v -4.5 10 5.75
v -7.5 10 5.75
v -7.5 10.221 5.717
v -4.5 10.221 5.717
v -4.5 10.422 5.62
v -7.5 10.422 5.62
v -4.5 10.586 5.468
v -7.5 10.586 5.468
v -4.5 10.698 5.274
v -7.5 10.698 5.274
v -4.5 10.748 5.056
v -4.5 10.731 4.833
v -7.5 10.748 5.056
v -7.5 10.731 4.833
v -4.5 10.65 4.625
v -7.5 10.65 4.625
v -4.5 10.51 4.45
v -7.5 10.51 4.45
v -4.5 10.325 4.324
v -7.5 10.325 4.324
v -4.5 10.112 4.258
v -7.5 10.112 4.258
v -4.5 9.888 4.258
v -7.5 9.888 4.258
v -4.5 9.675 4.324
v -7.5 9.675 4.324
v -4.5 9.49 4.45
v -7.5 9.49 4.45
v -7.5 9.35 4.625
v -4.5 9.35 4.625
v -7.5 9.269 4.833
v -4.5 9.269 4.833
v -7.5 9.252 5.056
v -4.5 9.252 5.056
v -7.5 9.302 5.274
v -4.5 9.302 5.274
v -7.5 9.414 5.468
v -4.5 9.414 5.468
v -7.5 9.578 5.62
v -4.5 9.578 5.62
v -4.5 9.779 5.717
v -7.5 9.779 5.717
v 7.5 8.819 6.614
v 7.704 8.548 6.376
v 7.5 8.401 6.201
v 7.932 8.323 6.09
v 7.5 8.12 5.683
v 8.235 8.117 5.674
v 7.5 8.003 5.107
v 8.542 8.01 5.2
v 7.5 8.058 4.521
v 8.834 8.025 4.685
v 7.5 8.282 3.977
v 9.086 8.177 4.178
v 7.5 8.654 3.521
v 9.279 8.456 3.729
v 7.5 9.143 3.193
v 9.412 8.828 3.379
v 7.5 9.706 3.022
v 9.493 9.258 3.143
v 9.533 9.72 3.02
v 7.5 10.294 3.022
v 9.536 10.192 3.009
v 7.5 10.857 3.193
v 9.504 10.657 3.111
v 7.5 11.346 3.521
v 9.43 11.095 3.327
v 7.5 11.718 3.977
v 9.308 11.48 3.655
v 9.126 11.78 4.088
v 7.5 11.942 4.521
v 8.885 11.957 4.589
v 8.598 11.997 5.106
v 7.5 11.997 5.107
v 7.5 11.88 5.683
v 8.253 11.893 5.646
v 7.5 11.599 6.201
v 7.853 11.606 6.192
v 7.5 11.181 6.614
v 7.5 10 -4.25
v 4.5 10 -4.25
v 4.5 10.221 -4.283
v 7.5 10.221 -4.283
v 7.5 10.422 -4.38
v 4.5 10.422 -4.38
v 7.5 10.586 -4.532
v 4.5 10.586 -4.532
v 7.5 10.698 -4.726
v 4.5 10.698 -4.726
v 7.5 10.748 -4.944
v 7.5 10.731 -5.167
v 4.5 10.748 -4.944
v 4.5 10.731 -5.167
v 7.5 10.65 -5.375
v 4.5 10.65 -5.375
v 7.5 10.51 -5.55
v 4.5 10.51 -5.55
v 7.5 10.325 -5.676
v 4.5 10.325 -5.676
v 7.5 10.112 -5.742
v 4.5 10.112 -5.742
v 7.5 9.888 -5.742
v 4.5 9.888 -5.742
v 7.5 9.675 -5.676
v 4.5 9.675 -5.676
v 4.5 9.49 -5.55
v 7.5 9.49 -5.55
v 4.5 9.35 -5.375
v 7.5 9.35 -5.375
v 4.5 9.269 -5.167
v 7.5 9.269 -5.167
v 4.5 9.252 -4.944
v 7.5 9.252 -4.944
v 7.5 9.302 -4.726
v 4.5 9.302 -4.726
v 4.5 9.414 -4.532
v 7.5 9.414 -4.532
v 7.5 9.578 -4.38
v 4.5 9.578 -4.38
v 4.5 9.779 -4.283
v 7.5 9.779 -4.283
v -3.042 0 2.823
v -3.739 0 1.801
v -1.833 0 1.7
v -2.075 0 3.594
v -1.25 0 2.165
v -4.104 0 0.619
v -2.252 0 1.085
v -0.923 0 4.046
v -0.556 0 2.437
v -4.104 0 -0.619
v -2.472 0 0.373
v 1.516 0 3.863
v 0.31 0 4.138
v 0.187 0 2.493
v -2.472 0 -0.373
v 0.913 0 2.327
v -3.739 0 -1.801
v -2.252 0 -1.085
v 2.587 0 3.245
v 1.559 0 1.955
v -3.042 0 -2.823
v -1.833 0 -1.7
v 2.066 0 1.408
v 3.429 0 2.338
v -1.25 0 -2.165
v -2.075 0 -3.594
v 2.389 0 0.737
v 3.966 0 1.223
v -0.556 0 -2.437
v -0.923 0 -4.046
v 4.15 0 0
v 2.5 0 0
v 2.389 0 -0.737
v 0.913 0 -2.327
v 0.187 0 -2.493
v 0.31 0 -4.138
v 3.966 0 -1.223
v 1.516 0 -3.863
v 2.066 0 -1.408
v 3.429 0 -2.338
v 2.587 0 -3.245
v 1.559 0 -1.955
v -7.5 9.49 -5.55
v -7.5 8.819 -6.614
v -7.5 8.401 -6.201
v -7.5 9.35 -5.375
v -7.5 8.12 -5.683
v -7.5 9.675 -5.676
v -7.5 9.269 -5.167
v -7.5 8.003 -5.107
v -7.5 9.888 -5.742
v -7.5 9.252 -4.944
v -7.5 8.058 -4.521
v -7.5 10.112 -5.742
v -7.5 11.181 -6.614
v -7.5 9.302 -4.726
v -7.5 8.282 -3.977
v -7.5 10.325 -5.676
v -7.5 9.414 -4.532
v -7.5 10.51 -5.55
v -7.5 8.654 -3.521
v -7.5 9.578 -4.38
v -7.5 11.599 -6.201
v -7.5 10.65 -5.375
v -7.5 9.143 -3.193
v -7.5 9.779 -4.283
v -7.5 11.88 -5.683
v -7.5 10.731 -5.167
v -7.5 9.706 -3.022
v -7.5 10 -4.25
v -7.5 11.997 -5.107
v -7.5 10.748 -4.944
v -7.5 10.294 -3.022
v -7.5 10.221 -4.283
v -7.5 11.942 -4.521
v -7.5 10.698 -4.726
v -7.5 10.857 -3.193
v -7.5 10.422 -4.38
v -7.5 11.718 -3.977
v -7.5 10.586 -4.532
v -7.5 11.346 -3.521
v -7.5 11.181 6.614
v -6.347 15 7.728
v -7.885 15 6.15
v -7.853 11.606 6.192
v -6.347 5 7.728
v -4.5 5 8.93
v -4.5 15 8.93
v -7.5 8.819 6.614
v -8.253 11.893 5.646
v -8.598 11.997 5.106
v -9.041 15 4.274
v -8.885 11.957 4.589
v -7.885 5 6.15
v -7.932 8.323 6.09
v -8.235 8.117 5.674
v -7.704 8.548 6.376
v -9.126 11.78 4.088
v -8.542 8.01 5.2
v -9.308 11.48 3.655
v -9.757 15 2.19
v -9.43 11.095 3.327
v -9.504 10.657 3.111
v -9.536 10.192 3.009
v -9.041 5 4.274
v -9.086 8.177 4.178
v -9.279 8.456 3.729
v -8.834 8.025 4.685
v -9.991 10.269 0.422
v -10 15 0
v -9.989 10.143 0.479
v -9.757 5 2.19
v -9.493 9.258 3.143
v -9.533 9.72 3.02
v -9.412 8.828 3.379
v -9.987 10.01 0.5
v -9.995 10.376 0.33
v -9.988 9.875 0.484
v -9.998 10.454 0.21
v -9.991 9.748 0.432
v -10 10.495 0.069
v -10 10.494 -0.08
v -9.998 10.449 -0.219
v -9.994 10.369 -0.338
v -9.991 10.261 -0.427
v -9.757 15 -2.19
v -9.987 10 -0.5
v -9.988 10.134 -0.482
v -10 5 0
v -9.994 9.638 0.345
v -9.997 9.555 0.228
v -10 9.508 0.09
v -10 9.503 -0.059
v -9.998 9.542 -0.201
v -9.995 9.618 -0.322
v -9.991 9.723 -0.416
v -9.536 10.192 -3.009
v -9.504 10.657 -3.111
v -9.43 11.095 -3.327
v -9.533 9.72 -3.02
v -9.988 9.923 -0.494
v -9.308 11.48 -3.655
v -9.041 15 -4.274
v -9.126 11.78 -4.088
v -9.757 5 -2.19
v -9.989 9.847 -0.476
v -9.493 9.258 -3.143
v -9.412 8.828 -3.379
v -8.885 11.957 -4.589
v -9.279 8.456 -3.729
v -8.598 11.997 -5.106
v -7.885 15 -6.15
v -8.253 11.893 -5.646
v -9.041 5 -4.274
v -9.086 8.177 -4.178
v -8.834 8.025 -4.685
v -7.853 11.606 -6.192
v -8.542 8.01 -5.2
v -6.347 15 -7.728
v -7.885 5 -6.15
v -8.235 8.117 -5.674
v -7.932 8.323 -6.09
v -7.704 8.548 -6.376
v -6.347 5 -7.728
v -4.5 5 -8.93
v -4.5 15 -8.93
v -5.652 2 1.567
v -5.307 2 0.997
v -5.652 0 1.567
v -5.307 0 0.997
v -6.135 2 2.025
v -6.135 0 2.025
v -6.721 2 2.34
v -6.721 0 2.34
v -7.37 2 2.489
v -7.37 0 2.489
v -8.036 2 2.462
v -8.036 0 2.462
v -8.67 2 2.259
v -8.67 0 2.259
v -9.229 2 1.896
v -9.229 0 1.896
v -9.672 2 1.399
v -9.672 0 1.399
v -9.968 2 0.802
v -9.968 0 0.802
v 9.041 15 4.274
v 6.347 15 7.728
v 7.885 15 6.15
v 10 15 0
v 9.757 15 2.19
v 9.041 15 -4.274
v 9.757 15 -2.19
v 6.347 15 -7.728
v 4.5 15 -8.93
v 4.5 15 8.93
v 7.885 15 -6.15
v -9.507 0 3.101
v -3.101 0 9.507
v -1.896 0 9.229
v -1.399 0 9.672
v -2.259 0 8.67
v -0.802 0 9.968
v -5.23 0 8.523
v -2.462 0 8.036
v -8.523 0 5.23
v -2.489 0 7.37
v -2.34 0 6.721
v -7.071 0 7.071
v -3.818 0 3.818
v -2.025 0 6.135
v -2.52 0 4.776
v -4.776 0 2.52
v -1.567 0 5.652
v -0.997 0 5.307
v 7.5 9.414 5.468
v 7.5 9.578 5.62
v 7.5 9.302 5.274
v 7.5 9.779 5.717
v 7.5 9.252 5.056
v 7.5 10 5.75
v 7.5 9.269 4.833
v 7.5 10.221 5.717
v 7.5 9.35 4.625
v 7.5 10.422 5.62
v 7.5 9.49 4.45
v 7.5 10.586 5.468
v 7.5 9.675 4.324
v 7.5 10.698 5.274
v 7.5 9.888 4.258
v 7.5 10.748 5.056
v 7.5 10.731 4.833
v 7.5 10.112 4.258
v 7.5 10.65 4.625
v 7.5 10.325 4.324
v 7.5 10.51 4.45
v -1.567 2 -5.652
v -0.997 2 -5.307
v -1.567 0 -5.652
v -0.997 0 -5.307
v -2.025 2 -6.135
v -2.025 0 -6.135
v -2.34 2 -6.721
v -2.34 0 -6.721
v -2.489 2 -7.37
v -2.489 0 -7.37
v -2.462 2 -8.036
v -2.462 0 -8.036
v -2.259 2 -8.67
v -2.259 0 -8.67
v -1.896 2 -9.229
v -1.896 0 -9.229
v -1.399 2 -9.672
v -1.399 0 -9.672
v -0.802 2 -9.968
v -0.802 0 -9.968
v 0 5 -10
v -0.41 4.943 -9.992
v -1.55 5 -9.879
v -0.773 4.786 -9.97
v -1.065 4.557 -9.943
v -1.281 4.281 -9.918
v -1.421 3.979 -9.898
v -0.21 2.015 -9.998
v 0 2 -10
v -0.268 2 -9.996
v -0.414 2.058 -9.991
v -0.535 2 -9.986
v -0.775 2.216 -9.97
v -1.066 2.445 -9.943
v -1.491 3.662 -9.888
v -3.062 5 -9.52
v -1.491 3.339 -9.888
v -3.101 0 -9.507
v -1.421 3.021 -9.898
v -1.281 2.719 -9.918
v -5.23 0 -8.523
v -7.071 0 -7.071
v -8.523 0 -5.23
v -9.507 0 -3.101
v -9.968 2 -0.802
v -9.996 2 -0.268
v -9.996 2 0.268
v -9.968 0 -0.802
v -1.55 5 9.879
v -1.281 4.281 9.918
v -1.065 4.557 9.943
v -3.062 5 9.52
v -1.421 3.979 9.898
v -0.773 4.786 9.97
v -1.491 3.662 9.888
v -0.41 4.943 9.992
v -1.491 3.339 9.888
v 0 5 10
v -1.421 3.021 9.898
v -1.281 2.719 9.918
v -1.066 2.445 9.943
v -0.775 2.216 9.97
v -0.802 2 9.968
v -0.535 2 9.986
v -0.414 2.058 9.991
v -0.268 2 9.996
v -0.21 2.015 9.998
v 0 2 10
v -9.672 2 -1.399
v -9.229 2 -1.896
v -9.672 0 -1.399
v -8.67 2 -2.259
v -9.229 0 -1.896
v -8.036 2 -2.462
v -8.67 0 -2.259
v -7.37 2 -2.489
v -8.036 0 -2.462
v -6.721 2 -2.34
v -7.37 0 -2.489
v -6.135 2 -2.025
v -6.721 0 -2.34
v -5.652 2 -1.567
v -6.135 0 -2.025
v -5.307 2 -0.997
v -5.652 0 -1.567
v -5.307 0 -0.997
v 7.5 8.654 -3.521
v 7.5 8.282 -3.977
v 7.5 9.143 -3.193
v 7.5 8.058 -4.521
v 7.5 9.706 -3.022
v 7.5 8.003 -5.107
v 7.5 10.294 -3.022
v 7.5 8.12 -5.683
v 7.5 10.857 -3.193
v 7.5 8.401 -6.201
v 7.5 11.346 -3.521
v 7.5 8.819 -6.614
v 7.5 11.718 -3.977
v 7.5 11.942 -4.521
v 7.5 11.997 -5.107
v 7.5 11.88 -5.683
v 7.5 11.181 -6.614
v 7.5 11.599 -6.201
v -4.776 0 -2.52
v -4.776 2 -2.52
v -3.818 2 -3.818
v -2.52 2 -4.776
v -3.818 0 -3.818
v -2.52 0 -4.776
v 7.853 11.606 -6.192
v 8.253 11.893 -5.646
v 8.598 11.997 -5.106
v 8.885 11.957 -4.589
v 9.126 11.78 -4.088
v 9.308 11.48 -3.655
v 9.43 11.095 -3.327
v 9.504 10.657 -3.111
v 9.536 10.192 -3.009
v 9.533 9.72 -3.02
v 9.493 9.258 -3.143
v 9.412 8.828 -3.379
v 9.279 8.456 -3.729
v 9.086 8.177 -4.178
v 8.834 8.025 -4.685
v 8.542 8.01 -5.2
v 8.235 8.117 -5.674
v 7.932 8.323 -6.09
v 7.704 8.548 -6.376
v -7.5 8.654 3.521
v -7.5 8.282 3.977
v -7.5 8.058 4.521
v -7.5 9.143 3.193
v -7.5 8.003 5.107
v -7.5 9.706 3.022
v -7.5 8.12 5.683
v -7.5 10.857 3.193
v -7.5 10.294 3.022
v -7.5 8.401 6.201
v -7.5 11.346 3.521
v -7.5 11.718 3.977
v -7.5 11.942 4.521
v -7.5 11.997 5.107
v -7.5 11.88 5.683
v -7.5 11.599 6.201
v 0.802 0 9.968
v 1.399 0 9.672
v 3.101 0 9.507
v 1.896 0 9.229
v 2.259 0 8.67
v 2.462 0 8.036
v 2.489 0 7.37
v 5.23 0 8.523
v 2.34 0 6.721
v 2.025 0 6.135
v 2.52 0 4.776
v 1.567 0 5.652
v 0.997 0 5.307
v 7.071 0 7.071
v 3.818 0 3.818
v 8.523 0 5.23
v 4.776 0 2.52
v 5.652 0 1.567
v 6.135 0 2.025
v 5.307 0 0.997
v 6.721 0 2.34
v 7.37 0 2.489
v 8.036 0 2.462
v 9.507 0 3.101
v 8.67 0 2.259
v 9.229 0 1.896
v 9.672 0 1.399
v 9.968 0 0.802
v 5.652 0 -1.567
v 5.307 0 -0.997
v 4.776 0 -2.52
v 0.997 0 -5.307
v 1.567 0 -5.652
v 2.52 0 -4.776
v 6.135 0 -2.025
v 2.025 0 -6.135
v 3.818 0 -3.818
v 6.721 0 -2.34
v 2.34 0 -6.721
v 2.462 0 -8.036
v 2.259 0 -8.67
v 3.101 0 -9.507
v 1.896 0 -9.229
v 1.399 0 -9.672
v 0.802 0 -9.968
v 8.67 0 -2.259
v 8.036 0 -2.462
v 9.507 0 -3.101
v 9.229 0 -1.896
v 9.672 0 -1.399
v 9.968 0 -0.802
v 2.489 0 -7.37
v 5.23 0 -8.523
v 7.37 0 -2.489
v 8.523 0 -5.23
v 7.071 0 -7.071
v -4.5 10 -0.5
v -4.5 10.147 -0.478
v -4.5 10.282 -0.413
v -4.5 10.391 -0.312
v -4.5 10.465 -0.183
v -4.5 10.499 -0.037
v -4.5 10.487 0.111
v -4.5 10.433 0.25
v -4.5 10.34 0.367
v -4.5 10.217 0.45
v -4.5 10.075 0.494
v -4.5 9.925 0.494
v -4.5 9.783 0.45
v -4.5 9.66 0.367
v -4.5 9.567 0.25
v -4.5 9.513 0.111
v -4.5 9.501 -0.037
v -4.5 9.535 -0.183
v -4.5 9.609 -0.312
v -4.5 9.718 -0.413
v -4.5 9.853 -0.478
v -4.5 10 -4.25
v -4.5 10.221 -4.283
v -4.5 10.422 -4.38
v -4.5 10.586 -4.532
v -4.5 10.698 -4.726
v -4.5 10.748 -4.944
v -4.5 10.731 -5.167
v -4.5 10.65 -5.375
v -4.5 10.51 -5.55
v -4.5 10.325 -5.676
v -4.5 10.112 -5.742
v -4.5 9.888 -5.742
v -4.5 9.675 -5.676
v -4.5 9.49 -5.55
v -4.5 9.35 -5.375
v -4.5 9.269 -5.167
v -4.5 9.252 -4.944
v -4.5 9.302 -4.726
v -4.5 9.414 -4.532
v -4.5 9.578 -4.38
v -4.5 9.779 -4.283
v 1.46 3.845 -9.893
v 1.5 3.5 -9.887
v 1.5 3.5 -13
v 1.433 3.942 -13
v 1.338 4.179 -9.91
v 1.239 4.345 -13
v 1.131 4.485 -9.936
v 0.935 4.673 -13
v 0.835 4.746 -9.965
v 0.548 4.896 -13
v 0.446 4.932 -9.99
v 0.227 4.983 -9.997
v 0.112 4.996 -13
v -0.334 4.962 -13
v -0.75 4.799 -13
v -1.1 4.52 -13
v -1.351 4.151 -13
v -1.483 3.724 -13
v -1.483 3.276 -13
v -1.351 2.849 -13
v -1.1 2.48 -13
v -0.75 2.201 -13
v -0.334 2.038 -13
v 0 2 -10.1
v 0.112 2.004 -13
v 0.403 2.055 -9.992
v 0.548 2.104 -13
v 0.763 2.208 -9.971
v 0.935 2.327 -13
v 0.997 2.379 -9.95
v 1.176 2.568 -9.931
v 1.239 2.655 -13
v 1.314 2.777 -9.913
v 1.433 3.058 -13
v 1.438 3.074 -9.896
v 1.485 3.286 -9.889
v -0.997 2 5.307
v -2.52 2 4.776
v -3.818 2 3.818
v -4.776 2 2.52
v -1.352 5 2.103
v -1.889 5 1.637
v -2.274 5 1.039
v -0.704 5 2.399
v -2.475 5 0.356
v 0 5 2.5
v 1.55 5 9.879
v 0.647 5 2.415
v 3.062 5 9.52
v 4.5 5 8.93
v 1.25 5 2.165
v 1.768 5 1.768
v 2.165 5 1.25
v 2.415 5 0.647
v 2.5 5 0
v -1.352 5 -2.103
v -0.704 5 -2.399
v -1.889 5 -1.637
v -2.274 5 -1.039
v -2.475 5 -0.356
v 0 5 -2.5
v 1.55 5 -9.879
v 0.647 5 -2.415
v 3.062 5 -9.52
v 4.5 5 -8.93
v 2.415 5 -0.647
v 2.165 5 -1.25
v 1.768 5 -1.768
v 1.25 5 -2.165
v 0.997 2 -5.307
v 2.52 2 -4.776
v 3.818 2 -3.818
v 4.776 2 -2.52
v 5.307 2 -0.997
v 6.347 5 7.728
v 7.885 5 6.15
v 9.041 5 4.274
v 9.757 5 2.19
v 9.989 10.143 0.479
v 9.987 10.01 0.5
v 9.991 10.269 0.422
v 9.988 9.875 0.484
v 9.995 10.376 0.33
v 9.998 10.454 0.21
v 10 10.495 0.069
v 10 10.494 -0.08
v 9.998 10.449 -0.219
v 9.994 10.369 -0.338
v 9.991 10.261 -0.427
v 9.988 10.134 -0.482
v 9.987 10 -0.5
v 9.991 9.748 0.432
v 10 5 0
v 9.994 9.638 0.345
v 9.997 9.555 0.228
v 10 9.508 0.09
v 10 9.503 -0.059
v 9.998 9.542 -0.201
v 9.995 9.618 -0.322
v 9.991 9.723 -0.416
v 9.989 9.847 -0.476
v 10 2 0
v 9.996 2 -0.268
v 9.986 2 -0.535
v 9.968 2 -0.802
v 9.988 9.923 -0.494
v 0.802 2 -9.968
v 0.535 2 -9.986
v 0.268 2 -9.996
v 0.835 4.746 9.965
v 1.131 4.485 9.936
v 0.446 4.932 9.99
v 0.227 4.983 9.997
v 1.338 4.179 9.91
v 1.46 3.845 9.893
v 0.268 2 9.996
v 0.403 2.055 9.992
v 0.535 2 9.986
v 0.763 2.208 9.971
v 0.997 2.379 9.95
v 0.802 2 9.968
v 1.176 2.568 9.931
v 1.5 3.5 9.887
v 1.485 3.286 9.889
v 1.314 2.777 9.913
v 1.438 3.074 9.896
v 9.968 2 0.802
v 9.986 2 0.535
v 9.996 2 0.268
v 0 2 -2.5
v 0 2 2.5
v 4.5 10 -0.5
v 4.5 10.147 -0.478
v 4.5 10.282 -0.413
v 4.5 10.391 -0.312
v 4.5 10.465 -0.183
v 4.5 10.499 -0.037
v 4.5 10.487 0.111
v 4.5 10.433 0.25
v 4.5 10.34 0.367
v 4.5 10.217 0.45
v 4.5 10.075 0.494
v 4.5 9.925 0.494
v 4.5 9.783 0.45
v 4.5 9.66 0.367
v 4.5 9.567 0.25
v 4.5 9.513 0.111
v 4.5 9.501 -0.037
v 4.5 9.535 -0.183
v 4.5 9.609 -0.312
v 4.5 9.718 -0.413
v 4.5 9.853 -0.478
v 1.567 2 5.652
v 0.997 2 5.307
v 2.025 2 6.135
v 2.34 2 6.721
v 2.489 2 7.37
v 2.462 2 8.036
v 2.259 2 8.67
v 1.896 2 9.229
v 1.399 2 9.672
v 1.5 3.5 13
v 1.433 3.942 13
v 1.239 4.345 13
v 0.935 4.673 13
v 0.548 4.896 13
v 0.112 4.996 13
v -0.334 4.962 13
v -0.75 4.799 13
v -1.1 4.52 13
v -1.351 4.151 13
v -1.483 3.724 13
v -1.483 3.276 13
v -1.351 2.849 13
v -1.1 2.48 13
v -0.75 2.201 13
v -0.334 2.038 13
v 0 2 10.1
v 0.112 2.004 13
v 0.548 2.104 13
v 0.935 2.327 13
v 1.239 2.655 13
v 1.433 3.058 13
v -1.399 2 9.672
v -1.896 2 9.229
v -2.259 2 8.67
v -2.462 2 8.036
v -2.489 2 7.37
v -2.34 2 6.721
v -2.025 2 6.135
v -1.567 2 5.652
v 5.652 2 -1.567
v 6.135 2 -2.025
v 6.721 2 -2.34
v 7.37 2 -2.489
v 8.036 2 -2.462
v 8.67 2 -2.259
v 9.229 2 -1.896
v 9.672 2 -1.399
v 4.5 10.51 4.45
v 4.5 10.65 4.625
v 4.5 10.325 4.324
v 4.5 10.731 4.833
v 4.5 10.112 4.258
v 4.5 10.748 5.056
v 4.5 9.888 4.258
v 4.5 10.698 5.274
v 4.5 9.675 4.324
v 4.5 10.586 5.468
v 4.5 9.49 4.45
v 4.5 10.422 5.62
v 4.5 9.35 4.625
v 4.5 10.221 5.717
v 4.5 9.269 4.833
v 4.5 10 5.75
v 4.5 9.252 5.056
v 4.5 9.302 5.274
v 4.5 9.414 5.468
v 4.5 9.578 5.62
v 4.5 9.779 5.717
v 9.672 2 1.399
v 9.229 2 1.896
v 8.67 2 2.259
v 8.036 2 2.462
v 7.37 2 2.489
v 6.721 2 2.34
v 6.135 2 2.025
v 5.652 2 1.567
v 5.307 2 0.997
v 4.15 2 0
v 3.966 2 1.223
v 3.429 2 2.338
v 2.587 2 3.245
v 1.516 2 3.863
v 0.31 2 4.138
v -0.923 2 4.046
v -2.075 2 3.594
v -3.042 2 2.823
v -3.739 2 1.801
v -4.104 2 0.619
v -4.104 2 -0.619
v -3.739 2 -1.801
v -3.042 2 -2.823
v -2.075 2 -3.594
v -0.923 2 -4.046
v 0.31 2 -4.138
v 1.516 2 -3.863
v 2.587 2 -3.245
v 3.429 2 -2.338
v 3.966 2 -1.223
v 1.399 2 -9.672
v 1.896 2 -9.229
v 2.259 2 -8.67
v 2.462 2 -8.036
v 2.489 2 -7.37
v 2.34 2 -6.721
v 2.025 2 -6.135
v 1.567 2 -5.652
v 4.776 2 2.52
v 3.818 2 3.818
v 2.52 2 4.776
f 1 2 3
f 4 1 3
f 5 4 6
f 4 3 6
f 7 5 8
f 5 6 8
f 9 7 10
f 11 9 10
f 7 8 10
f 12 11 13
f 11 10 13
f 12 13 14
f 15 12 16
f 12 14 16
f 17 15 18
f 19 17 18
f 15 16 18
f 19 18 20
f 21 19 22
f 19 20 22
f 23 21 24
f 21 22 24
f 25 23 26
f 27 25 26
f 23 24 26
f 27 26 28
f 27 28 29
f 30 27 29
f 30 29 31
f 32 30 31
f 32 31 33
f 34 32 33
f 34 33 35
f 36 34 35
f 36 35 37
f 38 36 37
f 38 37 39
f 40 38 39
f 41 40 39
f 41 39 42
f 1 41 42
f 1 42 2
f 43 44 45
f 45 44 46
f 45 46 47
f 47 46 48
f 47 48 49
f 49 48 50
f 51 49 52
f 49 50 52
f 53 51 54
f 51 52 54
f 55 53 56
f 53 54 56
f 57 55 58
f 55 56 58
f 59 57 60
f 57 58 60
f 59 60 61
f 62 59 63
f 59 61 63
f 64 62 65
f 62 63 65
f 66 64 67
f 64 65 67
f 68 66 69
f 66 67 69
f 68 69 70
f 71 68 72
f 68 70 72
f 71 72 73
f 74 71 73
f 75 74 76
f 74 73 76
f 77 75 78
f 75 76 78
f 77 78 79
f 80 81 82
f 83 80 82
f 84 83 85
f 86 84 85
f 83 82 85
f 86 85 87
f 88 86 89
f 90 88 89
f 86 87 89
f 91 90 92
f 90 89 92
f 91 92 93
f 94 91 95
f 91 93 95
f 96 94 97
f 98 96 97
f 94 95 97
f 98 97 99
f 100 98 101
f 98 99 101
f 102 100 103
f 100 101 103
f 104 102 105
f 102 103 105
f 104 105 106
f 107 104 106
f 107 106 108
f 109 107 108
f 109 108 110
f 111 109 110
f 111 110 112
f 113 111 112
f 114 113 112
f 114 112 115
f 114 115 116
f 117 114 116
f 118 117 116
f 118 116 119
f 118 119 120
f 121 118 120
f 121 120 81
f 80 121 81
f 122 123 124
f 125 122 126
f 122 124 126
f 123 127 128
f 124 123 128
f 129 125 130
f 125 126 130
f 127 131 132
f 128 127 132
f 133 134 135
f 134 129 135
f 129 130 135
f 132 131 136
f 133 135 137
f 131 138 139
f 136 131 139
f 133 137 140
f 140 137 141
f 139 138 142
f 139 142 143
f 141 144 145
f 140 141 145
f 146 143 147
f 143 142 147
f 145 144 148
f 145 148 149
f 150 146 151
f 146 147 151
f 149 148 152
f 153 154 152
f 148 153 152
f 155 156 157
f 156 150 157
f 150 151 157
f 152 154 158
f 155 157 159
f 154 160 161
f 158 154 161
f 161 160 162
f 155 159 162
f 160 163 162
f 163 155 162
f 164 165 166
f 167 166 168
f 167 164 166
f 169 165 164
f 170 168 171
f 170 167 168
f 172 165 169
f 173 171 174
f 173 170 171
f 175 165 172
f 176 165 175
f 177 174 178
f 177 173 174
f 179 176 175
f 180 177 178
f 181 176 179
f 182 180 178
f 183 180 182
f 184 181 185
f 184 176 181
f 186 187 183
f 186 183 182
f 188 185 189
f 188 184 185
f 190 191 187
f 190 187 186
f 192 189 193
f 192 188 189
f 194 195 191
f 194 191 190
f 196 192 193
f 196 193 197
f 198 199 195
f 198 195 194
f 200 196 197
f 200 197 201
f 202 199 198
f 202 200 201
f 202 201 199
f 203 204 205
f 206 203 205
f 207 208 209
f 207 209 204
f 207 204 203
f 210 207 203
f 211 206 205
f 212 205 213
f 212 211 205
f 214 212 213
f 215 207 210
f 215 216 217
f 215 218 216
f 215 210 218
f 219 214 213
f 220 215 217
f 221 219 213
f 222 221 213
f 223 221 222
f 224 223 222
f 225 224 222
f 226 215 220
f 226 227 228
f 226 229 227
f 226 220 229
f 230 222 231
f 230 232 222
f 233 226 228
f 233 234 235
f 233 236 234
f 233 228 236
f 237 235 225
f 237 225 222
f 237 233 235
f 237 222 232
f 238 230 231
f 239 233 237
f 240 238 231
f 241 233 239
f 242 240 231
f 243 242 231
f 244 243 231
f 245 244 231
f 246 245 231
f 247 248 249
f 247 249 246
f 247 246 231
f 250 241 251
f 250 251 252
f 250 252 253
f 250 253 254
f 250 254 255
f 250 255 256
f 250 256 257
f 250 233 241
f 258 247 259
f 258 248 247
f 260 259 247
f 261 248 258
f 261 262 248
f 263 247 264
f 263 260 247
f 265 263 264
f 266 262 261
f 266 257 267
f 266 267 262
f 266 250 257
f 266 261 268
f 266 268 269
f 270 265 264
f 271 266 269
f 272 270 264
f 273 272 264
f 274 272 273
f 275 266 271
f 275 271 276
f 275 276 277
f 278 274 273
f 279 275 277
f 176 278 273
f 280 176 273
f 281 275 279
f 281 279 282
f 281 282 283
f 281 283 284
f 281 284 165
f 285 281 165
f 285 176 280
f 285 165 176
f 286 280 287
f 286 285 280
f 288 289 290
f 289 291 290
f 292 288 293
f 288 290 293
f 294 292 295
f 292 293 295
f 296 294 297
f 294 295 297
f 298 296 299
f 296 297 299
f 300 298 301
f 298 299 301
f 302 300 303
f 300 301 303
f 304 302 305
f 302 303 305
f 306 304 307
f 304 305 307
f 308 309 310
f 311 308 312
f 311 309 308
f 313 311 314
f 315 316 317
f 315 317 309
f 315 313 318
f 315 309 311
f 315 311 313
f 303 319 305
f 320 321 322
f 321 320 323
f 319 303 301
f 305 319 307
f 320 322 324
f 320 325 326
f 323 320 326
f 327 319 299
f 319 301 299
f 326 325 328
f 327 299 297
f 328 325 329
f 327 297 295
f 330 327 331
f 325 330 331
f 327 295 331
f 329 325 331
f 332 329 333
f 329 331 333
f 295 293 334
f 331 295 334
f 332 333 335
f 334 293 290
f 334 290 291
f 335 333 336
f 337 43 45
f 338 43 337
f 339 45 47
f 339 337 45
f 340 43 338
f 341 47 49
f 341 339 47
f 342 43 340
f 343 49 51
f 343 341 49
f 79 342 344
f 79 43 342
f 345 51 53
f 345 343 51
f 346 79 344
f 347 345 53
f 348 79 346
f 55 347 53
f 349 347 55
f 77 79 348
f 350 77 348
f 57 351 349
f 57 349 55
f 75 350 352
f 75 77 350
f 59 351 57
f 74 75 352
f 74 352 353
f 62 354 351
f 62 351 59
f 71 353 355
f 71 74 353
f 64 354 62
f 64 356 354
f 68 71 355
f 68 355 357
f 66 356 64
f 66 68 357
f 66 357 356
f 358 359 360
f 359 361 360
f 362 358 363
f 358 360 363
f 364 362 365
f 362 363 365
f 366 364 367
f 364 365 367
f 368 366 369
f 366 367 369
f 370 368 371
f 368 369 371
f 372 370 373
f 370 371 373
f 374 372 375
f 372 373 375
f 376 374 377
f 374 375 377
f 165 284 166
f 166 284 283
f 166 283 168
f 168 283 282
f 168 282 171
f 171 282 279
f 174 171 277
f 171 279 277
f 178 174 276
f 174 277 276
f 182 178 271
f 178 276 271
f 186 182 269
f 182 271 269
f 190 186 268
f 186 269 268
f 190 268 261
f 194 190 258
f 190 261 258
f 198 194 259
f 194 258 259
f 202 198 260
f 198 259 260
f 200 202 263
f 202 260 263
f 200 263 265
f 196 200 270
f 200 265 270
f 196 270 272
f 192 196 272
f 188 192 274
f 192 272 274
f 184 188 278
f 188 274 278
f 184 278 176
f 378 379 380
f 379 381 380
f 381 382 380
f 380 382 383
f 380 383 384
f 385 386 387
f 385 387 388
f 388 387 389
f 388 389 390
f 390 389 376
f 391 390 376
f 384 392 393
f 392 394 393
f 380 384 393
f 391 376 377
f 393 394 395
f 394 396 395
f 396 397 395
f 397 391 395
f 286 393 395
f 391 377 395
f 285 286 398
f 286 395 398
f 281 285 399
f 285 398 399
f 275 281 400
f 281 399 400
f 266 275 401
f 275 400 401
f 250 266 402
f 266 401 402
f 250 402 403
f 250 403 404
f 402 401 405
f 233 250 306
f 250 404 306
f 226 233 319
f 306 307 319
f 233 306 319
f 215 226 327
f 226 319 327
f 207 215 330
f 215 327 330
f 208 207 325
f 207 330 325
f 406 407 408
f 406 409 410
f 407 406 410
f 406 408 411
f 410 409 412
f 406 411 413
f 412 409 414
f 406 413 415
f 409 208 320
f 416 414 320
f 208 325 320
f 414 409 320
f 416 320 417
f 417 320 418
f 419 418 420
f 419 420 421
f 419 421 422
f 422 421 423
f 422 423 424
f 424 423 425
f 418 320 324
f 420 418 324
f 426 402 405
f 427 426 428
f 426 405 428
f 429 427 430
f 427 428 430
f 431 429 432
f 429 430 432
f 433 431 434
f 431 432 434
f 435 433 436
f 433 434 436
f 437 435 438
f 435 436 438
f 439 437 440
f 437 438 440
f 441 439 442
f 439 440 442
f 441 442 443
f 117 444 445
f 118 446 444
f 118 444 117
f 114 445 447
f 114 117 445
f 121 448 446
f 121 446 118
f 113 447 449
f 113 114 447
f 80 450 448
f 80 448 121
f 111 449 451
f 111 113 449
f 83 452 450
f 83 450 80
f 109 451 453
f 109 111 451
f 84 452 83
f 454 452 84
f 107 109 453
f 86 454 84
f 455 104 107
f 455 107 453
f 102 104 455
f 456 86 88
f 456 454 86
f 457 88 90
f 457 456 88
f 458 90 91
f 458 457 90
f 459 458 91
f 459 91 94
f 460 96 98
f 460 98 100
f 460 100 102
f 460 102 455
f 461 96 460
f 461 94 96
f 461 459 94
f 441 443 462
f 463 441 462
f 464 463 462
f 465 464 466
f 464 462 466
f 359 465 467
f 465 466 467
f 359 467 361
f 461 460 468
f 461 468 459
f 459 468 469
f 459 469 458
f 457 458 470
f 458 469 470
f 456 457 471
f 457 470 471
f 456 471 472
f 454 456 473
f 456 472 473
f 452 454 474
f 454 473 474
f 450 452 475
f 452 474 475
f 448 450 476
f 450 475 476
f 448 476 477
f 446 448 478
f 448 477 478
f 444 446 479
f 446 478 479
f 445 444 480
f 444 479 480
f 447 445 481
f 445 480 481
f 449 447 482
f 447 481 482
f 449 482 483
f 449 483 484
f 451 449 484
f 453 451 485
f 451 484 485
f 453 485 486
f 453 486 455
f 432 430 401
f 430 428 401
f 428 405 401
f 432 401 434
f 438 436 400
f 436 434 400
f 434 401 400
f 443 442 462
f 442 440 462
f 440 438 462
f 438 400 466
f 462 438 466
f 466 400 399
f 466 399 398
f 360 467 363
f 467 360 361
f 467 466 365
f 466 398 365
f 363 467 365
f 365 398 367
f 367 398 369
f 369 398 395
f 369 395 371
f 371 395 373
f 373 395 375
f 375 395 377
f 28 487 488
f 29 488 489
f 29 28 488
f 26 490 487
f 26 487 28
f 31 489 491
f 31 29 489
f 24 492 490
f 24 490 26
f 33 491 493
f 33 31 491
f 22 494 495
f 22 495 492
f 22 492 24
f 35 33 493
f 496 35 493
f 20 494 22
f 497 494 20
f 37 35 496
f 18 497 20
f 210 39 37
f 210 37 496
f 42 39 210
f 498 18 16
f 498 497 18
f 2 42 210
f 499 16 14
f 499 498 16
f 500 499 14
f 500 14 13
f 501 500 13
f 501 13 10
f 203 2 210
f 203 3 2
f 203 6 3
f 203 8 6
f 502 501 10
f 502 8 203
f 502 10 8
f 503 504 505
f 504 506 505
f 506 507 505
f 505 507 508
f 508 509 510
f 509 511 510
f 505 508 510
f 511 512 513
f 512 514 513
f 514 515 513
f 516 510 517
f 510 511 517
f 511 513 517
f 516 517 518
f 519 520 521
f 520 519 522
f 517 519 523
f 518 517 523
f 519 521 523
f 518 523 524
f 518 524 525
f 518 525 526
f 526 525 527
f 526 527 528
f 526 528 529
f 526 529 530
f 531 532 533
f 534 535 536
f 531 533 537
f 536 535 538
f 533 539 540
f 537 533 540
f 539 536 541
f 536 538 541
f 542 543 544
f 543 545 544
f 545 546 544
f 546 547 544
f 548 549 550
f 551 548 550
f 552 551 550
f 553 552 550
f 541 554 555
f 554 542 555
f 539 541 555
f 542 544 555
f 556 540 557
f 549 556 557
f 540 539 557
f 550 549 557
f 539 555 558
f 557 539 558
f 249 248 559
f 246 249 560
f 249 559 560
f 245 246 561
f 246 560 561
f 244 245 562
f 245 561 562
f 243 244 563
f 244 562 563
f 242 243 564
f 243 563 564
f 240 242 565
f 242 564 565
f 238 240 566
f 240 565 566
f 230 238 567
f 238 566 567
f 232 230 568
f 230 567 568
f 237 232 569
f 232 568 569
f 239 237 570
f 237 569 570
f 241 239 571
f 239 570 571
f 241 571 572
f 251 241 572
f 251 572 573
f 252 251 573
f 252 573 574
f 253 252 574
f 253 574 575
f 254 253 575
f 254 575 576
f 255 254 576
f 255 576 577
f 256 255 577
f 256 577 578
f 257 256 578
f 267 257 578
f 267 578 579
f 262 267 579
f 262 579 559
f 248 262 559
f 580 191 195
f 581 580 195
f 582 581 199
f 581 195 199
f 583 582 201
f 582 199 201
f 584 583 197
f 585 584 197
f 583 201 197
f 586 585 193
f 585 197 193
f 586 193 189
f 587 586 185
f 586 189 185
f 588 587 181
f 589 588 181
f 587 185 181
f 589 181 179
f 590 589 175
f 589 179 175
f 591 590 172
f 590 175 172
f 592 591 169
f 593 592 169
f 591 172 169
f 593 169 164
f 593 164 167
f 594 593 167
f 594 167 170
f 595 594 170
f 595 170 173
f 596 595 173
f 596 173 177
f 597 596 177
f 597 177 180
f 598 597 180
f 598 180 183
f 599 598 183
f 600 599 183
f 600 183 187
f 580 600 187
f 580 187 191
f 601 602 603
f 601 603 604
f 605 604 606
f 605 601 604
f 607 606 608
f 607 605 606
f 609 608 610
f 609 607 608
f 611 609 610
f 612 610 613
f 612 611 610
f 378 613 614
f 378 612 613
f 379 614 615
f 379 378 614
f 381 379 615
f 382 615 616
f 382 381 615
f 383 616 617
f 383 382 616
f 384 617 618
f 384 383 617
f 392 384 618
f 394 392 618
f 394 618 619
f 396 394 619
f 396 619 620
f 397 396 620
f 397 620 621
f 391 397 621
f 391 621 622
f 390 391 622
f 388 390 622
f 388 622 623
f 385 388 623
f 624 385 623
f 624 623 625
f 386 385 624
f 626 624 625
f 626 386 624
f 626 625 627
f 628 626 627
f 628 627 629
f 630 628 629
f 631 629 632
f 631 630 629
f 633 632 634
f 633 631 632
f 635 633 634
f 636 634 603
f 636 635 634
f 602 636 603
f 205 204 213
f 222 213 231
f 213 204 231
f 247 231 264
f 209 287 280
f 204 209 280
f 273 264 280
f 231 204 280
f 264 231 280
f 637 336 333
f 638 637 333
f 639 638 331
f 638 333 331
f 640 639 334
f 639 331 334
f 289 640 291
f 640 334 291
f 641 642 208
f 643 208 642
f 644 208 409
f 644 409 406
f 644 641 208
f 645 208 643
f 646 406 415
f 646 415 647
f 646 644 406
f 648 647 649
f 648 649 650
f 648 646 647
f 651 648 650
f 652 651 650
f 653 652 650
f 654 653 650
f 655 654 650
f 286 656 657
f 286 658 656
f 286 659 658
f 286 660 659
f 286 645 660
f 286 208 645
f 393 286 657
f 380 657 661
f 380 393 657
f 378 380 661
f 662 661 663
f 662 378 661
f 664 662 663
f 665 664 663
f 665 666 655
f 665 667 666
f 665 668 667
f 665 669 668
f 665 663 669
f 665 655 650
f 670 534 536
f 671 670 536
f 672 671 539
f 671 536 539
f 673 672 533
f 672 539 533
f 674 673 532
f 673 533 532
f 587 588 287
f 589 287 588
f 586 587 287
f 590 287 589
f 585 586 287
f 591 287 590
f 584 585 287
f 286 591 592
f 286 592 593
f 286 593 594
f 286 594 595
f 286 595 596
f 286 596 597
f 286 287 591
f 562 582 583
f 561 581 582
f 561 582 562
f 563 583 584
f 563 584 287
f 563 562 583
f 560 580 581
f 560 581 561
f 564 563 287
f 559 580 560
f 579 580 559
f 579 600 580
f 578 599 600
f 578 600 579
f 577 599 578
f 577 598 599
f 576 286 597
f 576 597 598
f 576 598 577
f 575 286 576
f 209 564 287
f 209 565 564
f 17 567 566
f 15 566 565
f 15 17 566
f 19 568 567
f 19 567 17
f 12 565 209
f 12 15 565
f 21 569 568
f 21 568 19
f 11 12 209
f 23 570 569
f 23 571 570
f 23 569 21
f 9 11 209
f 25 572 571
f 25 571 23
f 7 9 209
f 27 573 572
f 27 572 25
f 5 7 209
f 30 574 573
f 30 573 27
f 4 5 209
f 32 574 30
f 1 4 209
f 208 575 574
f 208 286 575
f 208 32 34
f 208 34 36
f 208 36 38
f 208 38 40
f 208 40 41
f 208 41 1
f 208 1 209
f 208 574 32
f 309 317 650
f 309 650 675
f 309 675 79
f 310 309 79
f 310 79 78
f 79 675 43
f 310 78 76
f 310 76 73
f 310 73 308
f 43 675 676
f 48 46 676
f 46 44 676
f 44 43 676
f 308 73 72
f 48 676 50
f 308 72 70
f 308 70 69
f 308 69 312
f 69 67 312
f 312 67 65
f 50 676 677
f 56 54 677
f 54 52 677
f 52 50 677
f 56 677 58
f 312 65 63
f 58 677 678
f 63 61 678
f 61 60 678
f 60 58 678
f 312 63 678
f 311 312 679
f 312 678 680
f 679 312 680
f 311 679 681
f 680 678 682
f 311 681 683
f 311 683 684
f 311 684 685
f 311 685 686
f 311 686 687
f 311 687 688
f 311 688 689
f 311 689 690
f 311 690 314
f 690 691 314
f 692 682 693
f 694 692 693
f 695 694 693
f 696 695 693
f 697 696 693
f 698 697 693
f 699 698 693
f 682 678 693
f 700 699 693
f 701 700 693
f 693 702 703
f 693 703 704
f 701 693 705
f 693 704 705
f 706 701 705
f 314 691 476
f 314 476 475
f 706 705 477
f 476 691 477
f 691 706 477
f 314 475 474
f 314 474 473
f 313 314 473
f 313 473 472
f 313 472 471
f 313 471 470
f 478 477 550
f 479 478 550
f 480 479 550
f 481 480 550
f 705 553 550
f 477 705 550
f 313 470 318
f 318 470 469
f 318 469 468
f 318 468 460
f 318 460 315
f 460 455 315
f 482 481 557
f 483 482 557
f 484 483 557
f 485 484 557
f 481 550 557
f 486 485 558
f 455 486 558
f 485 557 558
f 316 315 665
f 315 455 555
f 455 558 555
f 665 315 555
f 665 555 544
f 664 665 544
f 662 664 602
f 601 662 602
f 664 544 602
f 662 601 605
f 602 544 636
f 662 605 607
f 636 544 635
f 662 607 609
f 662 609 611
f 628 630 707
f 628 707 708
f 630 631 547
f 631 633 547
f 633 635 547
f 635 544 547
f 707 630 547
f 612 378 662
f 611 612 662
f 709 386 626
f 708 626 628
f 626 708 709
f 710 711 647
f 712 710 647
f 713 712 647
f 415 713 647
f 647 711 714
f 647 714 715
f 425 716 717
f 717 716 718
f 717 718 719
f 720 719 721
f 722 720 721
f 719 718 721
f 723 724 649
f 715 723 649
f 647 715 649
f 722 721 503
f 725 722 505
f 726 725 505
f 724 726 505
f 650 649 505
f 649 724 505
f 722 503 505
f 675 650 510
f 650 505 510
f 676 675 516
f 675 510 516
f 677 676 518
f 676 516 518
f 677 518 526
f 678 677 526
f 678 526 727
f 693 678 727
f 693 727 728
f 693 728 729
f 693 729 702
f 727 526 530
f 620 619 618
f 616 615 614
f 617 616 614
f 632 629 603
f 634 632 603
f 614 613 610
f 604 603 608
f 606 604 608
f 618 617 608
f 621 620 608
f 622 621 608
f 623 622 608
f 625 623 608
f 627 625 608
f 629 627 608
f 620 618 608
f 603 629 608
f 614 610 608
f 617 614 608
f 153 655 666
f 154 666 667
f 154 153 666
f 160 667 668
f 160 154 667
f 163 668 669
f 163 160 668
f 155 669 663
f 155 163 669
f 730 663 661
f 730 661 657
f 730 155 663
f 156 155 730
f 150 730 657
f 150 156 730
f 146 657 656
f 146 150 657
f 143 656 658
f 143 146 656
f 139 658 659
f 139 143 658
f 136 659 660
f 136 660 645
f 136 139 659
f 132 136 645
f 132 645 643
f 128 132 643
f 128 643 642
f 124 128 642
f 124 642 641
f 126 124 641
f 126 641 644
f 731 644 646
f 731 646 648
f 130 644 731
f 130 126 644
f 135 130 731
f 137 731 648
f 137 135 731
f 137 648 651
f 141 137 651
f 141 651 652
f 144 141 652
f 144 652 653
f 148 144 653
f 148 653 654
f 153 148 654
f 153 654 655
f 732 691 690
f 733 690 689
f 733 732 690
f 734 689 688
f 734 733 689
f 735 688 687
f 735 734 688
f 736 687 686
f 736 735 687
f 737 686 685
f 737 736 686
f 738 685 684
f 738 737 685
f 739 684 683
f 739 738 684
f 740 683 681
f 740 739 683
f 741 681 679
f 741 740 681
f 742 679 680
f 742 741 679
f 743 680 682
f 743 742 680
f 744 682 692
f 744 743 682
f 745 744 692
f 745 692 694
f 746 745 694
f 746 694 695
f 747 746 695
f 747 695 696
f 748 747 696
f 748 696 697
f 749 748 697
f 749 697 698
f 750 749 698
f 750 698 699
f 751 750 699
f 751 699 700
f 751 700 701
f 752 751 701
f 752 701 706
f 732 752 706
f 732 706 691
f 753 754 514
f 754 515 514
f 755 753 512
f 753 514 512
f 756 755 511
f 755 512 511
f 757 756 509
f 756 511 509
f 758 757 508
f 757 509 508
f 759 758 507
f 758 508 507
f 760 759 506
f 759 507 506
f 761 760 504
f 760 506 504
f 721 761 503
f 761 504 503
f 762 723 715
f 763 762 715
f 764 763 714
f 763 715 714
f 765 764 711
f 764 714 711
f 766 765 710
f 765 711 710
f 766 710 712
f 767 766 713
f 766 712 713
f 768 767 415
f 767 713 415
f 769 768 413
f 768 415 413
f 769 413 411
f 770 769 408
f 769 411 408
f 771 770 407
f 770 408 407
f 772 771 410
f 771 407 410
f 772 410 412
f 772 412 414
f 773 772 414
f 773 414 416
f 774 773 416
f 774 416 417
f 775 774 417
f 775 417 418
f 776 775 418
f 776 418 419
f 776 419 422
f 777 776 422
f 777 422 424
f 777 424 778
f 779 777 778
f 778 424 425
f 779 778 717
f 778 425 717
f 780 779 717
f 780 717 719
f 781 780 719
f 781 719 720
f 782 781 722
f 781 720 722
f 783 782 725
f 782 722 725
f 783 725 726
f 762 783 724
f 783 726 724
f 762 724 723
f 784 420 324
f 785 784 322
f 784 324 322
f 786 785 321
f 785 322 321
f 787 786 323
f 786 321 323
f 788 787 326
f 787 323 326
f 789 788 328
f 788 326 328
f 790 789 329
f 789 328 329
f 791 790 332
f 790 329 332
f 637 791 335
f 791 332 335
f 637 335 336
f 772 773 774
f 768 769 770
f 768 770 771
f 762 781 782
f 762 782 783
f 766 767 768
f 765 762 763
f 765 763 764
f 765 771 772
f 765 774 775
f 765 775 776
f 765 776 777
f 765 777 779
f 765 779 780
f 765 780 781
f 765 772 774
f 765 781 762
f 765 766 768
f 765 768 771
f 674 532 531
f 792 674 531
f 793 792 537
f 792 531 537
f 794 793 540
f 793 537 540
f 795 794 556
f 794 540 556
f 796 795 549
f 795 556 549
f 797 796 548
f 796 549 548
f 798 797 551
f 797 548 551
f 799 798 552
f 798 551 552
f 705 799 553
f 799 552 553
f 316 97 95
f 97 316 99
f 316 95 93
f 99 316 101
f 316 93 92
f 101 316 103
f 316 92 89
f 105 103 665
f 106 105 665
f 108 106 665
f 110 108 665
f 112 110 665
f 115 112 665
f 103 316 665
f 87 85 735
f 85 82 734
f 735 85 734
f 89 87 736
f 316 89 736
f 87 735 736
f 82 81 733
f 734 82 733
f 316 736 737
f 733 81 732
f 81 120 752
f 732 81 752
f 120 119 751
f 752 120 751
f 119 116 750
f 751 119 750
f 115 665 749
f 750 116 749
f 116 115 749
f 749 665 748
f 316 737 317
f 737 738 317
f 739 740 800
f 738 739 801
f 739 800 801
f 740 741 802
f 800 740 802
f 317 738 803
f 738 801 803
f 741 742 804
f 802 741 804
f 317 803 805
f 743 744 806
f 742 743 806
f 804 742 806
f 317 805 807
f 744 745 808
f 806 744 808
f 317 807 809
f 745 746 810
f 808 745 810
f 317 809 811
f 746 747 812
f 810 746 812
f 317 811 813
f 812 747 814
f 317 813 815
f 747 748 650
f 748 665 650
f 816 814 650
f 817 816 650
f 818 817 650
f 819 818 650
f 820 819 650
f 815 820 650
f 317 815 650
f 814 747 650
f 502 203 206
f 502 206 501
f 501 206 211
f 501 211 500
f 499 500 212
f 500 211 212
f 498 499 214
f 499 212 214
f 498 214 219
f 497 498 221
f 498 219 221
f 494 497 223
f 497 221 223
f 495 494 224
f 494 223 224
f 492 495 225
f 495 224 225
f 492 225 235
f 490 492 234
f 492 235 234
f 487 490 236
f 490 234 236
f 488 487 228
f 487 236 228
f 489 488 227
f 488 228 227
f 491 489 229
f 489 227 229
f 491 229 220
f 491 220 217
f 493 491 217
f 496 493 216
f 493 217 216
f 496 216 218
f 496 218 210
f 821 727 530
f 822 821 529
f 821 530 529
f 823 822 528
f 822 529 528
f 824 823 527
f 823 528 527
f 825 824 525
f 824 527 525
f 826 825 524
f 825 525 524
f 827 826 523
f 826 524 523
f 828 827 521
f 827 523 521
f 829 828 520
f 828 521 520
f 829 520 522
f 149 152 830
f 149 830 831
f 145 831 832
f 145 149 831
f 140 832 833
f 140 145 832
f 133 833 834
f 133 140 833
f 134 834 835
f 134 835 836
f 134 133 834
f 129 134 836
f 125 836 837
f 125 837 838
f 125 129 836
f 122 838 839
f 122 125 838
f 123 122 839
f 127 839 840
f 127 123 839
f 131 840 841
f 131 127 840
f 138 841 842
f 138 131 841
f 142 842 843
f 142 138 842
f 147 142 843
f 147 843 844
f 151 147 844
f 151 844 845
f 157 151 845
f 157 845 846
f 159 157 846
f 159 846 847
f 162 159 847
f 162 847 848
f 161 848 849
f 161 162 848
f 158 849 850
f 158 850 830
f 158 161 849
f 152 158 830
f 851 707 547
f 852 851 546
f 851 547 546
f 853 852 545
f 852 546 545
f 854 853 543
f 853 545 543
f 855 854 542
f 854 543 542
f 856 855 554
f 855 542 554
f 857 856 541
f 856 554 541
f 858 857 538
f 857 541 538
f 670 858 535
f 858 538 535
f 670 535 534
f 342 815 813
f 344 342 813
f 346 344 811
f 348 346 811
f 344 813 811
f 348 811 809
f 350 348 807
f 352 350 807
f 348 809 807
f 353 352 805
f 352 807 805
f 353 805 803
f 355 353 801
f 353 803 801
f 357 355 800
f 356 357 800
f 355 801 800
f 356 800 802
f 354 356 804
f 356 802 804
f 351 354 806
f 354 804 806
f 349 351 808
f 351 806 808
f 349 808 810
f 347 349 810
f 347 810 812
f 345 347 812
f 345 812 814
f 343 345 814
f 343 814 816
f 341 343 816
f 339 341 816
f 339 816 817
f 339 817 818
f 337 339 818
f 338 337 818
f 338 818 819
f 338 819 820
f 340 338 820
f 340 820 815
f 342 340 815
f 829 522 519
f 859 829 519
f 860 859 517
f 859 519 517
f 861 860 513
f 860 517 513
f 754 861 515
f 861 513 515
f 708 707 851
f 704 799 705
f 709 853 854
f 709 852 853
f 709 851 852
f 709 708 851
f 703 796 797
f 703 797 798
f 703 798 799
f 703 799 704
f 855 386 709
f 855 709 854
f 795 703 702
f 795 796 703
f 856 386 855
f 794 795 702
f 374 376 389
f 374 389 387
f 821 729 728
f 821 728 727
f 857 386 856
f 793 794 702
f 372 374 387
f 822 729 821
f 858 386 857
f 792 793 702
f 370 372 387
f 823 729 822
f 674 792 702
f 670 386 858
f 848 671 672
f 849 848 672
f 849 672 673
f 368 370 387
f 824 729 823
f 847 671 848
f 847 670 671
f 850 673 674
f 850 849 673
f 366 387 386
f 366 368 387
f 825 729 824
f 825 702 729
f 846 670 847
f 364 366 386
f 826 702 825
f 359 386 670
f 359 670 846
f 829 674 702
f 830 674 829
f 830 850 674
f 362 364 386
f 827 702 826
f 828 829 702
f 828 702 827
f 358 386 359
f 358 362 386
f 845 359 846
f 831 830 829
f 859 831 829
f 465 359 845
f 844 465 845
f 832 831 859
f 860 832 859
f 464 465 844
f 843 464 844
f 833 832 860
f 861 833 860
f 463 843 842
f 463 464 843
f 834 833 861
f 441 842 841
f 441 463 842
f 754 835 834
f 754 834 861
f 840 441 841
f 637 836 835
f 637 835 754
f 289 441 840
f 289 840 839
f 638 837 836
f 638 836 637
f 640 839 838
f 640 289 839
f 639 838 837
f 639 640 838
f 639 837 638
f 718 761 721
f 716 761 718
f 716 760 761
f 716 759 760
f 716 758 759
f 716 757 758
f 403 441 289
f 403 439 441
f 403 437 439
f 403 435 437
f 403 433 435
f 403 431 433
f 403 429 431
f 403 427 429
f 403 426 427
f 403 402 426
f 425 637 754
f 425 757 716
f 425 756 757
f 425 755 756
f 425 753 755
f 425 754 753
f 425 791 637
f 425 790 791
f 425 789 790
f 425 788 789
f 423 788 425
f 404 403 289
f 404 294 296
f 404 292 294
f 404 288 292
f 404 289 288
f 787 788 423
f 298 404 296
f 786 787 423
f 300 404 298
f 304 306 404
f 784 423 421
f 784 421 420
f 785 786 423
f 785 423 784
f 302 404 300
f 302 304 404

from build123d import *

# Parameters (mm, degrees)
SKETCH1_R                      = 10
SKETCH1_R_2                    = 2.5
BOSS_EXTRUDE1_DEPTH            = 5
BOSS_EXTRUDE4_DEPTH            = 10
SKETCH6_R                      = 0.75
CUT_EXTRUDE3_DEPTH             = 21
SKETCH7_R                      = 2
CUT_EXTRUDE4_DEPTH             = 2.5
SKETCH8_R                      = 2
CUT_EXTRUDE5_DEPTH             = 2.5
BOSS_EXTRUDE5_START            = -7.5
SKETCH10_R                     = 1.5
BOSS_EXTRUDE5_DEPTH            = 10.5
CUT_EXTRUDE6_REACH             = 12
SKETCH11_R                     = 0.5
CUT_EXTRUDE6_DIRECTION_2_REACH = 12
SKETCH12_R                     = 2.5
CUT_EXTRUDE7_DEPTH             = 2
CIRPATTERN1_COUNT              = 4
SKETCH13_R                     = 5.4
SKETCH13_R_2                   = 4.15
CUT_EXTRUDE8_DEPTH             = 2


with BuildPart() as part:
    # Sketch1 → Boss-Extrude1 (new body)
    with BuildSketch(Plane(origin=(0, 0, 0), x_dir=(1, 0, 0), z_dir=(0, 1, 0))):
        Circle(SKETCH1_R)
        Circle(SKETCH1_R_2, mode=Mode.SUBTRACT)
    extrude(amount=BOSS_EXTRUDE1_DEPTH)

    # Sketch5 → Boss-Extrude4 (add)
    with BuildSketch(Plane(origin=(0, 5, 0), x_dir=(1, 0, 0), z_dir=(0, 1, 0))):
        with BuildLine():
            Line((4.5, 8.93028555), (4.5, -8.93028555))
            ThreePointArc((4.5, -8.93028555), (10, 0), (4.5, 8.93028555))
        make_face()
        with BuildLine():
            Line((-4.5, 8.93028555), (-4.5, -8.93028555))
            ThreePointArc((-4.5, -8.93028555), (-10, 0), (-4.5, 8.93028555))
        make_face()
    extrude(amount=BOSS_EXTRUDE4_DEPTH)

    # Sketch6 → Cut-Extrude3 (cut, through all)
    with BuildSketch(Plane.ZY.offset(10)):
        with Locations((-5, 10)):
            Circle(SKETCH6_R)
        with Locations((5, 10)):
            Circle(SKETCH6_R)
    extrude(amount=-CUT_EXTRUDE3_DEPTH, mode=Mode.SUBTRACT)

    # Sketch7 → Cut-Extrude4 (cut)
    with BuildSketch(Plane.ZY.offset(10)):
        with Locations((-5, 10)):
            Circle(SKETCH7_R)
        with Locations((5, 10)):
            Circle(SKETCH7_R)
    extrude(amount=-CUT_EXTRUDE4_DEPTH, mode=Mode.SUBTRACT)

    # Sketch8 → Cut-Extrude5 (cut)
    with BuildSketch(Plane(origin=(10, 0, 0), x_dir=(0, 0, -1), z_dir=(1, 0, 0))):
        with Locations((-5, 10)):
            Circle(SKETCH8_R)
        with Locations((5, 10)):
            Circle(SKETCH8_R)
    extrude(amount=-CUT_EXTRUDE5_DEPTH, mode=Mode.SUBTRACT)

    # Sketch10 → Boss-Extrude5 (add)
    with BuildSketch(Plane.XY.offset(10).offset(BOSS_EXTRUDE5_START)):
        with Locations((0, 3.5)):
            Circle(SKETCH10_R)
    boss_extrude5 = extrude(amount=BOSS_EXTRUDE5_DEPTH)

    # Mirror1: Boss-Extrude5 across plane
    add(boss_extrude5.mirror(Plane.XY))

    # Sketch11 → Cut-Extrude6 (cut, up to next)
    with BuildSketch(Plane(origin=(0, 0, 0), x_dir=(0, 0, -1), z_dir=(1, 0, 0)), mode=Mode.PRIVATE) as cut_extrude6_sk1:
        with Locations((0, 10)):
            Circle(SKETCH11_R)
    cut_extrude6_tool1 = extrude(cut_extrude6_sk1.sketch, amount=-CUT_EXTRUDE6_REACH, mode=Mode.PRIVATE) & part.part
    add(cut_extrude6_tool1.solids().sort_by_distance((0, 10, 0))[0], mode=Mode.SUBTRACT)

    # Sketch11 → Cut-Extrude6 direction 2 (cut, up to next)
    with BuildSketch(Plane(origin=(0, 0, 0), x_dir=(0, 0, -1), z_dir=(1, 0, 0)), mode=Mode.PRIVATE) as cut_extrude6_direction_2_sk1:
        with Locations((0, 10)):
            Circle(SKETCH11_R)
    cut_extrude6_direction_2_tool1 = extrude(cut_extrude6_direction_2_sk1.sketch, amount=CUT_EXTRUDE6_DIRECTION_2_REACH, mode=Mode.PRIVATE) & part.part
    add(cut_extrude6_direction_2_tool1.solids().sort_by_distance((0, 10, 0))[0], mode=Mode.SUBTRACT)

    # Sketch12 → Cut-Extrude7 (cut)
    with BuildSketch(Plane.XZ):
        with Locations((-7.6, 0)):
            Circle(SKETCH12_R)
    cut_extrude7 = extrude(amount=-CUT_EXTRUDE7_DEPTH, mode=Mode.SUBTRACT)

    # CirPattern1: Cut-Extrude7 ×4 about axis
    cirpattern1_axis = Axis((0, 0, 0), (0, 1, 0))
    for i in range(1, CIRPATTERN1_COUNT):
        add(cut_extrude7.rotate(cirpattern1_axis, i * 360 / CIRPATTERN1_COUNT), mode=Mode.SUBTRACT)

    # Sketch13 → Cut-Extrude8 (cut)
    with BuildSketch(Plane.XZ):
        Circle(SKETCH13_R)
        Circle(SKETCH13_R_2, mode=Mode.SUBTRACT)
    extrude(amount=-CUT_EXTRUDE8_DEPTH, mode=Mode.SUBTRACT)


solid = part.part
